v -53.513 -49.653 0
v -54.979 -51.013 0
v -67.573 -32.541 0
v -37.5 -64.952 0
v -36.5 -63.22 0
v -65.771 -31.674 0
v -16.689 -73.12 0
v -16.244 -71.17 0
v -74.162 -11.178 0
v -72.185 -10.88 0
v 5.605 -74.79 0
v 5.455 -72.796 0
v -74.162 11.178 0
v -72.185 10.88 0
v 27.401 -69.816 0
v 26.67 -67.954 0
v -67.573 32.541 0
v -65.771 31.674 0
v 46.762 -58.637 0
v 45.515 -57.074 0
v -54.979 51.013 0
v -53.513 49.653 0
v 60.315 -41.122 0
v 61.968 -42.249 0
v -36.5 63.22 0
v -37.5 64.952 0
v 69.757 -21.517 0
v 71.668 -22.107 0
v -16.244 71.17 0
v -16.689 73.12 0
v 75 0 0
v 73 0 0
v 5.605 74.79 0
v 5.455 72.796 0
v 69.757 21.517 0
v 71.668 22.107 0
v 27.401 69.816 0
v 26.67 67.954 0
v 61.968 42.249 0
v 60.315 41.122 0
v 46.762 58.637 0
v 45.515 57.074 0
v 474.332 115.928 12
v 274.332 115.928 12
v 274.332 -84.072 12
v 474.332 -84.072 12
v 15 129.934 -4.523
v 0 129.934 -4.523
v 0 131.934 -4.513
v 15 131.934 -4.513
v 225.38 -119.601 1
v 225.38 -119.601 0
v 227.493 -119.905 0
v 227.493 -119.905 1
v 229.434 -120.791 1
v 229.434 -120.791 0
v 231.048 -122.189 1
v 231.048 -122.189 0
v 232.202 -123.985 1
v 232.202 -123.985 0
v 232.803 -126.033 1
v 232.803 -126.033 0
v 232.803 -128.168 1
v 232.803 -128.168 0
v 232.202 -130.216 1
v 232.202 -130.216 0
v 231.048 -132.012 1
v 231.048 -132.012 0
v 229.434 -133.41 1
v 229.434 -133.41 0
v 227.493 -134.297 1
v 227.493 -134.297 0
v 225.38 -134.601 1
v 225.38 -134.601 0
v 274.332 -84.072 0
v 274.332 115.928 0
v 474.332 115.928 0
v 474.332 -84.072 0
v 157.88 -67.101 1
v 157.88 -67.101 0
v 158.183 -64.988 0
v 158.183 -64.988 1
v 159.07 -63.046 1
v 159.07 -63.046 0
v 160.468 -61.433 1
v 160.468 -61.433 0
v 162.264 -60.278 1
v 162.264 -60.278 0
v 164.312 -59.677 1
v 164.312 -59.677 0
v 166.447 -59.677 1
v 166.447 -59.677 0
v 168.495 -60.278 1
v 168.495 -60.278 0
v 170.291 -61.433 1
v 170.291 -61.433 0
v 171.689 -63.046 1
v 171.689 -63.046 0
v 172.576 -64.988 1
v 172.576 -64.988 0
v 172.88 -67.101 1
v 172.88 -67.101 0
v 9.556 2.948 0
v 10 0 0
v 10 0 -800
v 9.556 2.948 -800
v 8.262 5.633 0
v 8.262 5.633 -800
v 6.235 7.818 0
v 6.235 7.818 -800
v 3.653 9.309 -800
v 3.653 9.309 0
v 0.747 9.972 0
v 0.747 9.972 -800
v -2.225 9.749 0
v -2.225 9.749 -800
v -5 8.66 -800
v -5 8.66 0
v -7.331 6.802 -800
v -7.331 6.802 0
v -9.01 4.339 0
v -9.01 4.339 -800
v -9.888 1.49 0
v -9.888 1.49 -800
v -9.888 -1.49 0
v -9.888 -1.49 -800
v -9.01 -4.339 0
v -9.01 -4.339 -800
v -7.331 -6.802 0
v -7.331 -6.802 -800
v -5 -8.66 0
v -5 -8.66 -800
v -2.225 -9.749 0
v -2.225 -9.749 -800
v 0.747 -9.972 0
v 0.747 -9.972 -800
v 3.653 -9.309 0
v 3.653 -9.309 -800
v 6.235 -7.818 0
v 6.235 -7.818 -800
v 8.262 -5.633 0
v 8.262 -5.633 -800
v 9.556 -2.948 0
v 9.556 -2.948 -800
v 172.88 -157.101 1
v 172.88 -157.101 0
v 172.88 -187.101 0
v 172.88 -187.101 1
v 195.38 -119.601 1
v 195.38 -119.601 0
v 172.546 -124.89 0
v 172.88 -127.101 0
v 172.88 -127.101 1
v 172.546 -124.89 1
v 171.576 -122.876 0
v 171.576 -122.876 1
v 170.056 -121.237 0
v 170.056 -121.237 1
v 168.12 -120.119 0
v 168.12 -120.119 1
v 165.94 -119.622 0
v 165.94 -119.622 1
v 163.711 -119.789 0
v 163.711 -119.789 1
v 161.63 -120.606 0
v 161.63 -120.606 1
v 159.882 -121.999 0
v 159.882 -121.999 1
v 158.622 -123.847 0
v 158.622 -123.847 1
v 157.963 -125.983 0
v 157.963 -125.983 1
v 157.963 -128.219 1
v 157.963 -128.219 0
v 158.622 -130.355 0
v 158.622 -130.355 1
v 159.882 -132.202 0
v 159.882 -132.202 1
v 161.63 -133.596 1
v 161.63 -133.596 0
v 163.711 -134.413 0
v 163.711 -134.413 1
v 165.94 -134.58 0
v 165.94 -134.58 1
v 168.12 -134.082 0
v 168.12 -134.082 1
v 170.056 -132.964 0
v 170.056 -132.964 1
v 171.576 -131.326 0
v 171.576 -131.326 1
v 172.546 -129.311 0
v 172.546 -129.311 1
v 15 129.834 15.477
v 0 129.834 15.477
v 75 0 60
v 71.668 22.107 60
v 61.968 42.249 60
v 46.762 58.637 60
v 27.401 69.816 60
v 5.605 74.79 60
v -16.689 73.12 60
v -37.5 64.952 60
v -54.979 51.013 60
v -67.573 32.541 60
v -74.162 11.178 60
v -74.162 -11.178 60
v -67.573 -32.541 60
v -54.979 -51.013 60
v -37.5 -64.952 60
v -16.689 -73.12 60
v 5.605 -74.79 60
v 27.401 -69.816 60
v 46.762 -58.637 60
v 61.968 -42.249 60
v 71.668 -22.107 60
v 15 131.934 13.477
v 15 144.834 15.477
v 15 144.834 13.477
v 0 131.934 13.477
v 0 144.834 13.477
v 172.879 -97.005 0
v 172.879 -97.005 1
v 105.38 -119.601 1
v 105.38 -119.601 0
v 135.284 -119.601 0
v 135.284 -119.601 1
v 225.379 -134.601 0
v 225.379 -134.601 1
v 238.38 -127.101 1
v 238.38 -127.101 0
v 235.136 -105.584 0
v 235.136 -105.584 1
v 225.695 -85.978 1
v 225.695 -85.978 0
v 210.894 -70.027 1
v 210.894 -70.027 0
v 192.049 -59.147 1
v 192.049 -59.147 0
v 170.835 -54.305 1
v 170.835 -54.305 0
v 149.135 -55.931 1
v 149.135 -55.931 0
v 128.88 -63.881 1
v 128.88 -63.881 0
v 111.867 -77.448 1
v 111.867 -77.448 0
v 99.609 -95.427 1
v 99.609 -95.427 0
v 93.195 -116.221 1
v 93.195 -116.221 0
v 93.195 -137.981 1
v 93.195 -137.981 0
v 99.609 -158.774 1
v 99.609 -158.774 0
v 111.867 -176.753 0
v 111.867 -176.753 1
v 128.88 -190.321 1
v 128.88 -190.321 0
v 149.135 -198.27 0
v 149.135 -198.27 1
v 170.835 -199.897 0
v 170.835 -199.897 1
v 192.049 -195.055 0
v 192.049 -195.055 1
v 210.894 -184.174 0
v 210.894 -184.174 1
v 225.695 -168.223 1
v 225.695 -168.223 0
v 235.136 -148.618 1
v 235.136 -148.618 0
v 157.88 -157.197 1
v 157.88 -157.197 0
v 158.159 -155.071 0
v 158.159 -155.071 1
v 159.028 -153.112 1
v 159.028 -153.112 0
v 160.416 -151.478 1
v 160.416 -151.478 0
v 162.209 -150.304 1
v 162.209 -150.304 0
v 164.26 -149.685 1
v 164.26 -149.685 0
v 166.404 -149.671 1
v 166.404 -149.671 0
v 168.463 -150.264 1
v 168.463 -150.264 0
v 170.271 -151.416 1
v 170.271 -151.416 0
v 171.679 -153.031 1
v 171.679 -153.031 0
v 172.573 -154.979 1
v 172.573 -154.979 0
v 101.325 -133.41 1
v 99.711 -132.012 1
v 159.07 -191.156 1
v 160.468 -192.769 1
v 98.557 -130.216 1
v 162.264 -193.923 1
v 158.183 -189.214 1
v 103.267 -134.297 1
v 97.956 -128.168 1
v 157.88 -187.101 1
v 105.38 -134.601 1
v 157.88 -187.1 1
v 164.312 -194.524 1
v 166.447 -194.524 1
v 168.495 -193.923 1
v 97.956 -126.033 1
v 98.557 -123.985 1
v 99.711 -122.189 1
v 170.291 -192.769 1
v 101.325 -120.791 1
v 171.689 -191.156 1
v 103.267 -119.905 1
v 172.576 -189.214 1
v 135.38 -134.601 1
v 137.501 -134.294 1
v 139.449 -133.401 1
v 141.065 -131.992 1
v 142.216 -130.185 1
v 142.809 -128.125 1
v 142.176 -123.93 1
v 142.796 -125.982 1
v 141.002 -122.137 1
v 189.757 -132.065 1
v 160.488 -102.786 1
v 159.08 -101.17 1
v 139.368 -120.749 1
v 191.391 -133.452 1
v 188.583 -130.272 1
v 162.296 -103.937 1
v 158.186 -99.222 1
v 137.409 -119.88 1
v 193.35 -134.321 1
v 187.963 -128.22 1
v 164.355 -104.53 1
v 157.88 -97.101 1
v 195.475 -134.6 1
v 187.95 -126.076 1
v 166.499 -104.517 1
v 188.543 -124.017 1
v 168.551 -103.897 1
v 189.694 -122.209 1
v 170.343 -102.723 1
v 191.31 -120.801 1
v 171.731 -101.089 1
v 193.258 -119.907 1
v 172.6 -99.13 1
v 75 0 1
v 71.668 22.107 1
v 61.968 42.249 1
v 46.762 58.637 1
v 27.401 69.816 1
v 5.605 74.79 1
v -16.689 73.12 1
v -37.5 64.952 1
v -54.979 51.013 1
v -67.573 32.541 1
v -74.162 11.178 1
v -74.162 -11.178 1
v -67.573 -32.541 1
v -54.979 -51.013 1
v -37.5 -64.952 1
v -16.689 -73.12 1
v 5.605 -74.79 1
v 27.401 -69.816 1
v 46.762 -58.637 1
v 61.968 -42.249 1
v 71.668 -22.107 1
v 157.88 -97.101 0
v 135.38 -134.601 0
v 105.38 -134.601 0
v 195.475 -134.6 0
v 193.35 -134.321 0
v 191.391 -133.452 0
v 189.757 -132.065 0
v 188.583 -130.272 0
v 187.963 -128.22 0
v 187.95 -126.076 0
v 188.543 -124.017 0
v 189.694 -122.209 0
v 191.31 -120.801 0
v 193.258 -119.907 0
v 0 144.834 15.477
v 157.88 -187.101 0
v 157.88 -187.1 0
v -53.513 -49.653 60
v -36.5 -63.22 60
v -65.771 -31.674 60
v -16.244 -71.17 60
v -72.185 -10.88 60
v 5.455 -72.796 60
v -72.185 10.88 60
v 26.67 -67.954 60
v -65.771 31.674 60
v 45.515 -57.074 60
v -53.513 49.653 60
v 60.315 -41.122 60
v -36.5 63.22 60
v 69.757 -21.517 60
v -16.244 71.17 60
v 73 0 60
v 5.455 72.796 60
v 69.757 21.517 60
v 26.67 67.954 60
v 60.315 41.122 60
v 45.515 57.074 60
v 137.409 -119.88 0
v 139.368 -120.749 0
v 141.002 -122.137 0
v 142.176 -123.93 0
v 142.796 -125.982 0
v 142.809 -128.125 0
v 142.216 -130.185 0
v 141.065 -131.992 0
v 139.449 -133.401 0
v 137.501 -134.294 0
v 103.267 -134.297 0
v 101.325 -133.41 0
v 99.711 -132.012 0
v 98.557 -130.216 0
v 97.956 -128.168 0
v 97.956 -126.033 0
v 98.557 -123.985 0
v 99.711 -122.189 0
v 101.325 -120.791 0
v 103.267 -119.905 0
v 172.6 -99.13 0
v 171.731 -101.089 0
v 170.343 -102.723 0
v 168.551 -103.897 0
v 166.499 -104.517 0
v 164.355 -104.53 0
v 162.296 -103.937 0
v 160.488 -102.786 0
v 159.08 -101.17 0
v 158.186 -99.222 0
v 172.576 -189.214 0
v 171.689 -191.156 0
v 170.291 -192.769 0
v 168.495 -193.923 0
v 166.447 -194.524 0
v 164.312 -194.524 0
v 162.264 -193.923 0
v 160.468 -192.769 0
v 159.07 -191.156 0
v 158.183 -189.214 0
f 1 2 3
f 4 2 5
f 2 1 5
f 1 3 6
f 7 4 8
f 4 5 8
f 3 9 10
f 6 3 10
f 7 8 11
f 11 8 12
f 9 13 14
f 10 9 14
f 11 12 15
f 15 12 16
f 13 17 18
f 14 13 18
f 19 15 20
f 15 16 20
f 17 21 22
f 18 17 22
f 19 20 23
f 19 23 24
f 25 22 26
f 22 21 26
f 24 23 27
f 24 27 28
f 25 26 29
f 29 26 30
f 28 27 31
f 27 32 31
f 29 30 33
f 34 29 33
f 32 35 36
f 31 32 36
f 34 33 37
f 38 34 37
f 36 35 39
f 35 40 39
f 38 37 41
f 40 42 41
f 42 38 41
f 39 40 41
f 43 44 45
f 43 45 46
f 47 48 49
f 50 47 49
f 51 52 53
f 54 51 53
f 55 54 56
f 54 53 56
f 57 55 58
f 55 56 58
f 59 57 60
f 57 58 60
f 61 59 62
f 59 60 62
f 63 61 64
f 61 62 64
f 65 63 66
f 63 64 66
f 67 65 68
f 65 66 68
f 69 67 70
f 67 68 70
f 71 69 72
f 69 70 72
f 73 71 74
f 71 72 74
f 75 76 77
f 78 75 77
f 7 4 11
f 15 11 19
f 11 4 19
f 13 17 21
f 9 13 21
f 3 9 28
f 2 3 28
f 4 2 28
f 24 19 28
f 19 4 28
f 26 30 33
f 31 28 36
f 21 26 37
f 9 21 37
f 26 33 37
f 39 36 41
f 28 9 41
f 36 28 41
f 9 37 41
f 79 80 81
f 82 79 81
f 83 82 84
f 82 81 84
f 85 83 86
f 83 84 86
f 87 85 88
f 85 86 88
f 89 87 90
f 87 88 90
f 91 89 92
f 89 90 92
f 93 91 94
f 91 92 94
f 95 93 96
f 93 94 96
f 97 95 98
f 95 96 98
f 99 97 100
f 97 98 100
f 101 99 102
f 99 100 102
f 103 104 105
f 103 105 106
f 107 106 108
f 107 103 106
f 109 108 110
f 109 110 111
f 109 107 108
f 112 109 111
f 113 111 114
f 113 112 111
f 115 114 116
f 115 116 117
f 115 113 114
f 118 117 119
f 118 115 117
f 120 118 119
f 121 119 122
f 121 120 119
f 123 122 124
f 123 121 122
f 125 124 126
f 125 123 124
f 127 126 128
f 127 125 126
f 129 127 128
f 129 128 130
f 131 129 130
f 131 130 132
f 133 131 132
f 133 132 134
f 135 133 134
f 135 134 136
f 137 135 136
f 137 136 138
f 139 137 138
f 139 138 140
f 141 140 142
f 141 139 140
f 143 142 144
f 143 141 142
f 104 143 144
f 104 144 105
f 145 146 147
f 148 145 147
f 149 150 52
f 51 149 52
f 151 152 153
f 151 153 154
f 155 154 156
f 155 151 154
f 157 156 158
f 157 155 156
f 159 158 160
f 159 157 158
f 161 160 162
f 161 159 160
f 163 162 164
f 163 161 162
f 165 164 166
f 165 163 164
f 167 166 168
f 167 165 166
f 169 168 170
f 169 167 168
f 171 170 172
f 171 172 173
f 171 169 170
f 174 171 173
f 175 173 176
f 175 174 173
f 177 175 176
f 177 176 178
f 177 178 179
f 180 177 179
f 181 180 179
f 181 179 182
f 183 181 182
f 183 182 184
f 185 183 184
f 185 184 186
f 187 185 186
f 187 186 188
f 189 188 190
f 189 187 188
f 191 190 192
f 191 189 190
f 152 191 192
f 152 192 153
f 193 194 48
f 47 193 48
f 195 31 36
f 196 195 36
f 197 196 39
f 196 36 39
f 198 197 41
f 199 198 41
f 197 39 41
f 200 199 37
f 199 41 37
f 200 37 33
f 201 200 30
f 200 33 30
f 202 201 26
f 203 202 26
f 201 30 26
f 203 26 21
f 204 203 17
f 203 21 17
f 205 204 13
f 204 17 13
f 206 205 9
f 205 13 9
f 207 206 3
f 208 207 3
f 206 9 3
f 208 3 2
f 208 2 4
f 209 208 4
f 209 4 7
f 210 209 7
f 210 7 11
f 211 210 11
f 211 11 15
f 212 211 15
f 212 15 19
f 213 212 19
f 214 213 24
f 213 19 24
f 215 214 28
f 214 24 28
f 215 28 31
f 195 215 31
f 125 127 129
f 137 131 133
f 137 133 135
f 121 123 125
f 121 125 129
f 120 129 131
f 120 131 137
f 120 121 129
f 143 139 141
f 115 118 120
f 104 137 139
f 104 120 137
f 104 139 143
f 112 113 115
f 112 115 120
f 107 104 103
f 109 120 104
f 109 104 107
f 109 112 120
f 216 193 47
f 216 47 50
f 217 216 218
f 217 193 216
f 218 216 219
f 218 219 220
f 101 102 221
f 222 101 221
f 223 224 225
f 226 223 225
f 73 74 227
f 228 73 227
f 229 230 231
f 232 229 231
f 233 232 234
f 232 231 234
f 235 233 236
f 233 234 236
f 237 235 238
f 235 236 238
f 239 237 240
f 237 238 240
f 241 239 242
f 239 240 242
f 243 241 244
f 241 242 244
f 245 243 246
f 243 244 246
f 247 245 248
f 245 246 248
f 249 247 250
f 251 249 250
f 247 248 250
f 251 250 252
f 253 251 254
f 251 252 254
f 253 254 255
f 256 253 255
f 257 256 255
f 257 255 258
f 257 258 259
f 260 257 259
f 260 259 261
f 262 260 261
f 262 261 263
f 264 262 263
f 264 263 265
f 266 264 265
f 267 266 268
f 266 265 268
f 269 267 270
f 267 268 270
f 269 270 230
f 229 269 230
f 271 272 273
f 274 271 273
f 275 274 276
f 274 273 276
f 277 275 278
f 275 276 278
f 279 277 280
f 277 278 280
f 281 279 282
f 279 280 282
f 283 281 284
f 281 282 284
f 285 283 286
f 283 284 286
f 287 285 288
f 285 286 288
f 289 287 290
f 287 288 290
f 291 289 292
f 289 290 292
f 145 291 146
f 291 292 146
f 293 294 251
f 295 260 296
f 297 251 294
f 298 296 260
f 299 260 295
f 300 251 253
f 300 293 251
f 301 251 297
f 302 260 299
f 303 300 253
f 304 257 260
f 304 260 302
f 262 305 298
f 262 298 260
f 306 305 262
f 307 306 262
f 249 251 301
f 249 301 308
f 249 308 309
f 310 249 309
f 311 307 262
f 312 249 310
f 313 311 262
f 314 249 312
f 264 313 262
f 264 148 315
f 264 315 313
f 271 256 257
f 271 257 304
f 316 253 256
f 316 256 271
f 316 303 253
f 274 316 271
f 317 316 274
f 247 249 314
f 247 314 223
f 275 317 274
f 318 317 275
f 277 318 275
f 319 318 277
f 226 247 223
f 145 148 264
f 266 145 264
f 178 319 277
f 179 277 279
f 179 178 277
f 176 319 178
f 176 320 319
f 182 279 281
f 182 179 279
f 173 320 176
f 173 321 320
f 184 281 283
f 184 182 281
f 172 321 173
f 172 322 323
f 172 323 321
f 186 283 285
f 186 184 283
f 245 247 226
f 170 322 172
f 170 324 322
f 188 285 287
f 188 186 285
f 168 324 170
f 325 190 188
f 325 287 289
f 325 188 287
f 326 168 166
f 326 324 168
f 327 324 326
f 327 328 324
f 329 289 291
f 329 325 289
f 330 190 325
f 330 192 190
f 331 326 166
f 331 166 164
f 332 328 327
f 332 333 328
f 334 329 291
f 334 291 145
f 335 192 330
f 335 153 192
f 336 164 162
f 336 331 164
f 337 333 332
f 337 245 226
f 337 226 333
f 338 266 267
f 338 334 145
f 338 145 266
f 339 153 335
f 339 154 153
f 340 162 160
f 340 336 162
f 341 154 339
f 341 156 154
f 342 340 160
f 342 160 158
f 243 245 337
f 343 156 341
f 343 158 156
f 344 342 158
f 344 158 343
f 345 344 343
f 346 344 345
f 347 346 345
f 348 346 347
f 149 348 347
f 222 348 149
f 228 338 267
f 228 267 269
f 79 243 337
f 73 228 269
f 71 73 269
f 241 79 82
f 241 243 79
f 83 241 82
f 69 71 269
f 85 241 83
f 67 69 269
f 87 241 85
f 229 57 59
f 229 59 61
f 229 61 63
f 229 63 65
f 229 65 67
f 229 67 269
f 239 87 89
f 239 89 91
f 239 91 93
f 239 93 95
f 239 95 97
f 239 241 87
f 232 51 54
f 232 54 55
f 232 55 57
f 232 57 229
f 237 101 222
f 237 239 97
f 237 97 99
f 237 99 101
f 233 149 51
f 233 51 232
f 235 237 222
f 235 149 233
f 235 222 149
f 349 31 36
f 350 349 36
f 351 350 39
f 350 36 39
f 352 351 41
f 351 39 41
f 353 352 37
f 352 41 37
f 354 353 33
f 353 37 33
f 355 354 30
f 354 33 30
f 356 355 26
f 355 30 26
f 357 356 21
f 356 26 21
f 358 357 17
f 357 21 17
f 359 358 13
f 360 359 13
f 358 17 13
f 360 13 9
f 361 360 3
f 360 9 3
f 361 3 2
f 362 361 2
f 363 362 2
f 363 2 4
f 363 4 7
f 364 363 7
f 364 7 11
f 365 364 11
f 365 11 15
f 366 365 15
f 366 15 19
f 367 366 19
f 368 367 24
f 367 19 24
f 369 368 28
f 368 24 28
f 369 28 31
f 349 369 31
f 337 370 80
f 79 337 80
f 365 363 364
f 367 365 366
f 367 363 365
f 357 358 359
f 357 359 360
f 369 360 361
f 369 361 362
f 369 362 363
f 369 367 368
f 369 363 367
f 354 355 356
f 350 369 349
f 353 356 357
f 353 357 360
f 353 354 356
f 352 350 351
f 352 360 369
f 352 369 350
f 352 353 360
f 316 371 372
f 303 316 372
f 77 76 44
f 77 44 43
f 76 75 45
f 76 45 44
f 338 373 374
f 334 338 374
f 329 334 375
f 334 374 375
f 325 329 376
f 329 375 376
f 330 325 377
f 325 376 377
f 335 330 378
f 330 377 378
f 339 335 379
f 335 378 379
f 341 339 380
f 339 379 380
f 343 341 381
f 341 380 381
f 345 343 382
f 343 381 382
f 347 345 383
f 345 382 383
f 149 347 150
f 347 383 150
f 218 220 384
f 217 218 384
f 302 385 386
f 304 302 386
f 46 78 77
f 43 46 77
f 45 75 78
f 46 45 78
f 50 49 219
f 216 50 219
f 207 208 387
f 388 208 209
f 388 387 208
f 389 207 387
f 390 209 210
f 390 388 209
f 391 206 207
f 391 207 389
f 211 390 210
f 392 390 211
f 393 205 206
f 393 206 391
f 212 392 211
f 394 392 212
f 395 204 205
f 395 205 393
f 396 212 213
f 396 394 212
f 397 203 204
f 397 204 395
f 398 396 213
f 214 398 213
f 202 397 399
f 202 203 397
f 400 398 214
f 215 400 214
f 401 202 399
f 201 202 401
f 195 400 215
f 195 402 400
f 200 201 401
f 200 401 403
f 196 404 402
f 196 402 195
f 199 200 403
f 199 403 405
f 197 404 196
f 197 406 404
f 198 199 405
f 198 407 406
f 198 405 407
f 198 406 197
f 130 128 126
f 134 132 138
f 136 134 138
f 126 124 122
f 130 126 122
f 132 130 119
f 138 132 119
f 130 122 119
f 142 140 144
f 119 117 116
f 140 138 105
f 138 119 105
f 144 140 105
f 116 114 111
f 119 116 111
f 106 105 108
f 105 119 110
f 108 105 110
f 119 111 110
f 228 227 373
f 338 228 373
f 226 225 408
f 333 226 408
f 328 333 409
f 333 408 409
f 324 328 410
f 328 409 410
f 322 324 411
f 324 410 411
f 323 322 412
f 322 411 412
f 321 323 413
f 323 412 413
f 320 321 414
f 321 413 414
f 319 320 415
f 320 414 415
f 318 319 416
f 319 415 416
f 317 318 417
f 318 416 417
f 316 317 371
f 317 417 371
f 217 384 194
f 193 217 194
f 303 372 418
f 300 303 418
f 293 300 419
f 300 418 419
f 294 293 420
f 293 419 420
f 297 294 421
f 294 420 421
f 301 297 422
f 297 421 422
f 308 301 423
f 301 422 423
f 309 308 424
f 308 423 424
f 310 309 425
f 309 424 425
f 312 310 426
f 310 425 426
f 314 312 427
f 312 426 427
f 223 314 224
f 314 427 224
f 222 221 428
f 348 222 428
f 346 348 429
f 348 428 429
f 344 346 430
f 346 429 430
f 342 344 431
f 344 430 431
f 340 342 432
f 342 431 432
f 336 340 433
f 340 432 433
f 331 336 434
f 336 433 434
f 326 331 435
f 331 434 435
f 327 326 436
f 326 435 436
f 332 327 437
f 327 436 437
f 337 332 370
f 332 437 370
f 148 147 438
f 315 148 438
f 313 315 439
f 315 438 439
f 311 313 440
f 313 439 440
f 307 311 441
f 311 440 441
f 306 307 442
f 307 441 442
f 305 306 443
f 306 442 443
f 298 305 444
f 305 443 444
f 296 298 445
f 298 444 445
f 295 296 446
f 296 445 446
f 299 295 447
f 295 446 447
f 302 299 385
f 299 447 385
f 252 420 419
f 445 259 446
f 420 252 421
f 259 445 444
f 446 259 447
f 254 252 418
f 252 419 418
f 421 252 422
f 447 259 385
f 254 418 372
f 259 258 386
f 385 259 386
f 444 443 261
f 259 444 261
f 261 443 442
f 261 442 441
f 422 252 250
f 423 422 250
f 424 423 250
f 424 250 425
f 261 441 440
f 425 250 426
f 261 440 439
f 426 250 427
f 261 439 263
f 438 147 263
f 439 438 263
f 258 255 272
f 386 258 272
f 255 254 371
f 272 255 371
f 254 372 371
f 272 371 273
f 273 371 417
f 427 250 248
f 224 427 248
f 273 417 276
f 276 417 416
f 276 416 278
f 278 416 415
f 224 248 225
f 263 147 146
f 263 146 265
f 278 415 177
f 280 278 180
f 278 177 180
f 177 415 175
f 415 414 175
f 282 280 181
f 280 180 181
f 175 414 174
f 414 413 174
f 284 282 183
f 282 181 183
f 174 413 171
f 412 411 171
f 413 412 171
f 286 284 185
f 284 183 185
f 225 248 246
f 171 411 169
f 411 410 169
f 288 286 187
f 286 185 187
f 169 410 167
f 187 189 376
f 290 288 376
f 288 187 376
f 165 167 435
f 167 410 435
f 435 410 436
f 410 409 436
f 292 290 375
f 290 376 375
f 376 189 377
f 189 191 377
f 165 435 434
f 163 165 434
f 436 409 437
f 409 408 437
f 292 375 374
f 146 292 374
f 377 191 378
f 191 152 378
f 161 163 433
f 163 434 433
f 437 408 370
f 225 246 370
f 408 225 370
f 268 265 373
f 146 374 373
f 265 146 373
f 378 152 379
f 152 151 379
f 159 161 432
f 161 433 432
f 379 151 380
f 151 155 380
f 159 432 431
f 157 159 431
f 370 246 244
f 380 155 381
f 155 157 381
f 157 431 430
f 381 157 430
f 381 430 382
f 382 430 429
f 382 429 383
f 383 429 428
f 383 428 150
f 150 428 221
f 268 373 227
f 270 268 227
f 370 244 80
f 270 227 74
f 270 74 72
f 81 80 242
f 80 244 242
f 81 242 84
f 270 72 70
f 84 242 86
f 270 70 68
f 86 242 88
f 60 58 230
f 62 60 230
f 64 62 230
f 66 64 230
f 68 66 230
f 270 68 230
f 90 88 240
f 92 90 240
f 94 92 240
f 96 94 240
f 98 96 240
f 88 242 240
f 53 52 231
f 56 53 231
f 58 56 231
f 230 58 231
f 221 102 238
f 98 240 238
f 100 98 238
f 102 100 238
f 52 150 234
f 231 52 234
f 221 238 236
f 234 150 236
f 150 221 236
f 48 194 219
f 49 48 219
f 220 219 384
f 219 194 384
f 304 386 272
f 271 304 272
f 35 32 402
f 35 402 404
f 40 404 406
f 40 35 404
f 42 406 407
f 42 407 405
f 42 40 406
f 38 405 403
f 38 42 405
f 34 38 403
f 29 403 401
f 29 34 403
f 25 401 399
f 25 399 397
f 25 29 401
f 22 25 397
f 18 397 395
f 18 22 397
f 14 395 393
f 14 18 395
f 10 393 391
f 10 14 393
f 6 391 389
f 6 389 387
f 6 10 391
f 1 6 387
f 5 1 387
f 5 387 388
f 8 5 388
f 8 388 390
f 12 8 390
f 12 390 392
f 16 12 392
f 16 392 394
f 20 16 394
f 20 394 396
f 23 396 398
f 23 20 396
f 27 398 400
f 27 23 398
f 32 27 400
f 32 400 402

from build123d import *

# Parameters (mm, degrees)
F0_R     = 75
F0_R_2   = 73
F1_DEPTH = 60
F0_R_3   = 10
F2_DEPTH = 800
F3_DEPTH = 1
F4_DEPTH = 12
F0_W     = 200
F0_H     = 200
F0_R_4   = 7.5
F7_DEPTH = 1
F9_DEPTH = 15


with BuildPart() as f1:
    # F0 (on Top) → F1 (new body)
    with BuildSketch(Plane.XY):
        Circle(F0_R)
        Circle(F0_R_2, mode=Mode.SUBTRACT)
    extrude(amount=F1_DEPTH)


with BuildPart() as f2:
    # F0 (on Top) → F2 (new body)
    with BuildSketch(Plane.XY):
        Circle(F0_R_3)
    extrude(amount=-F2_DEPTH)


with BuildPart() as f3:
    # F0 (on Top) → F3 (new body)
    with BuildSketch(Plane.XY):
        Circle(F0_R)
        Circle(F0_R_2, mode=Mode.SUBTRACT)
        Circle(F0_R_2)
        Circle(F0_R_3, mode=Mode.SUBTRACT)
        Circle(F0_R_3)
    extrude(amount=F3_DEPTH)


with BuildPart() as f4:
    # F0 (on Top) → F4 (new body)
    with BuildSketch(Plane.XY):
        Circle(F0_R)
        Circle(F0_R_2, mode=Mode.SUBTRACT)
    extrude(amount=F4_DEPTH)


with BuildPart() as f4b:
    # F0 (on Top) → F4, piece 2 (new body)
    with BuildSketch(Plane.XY):
        with Locations((374.331599474, 15.927529335)):
            Rectangle(F0_W, F0_H)
    extrude(amount=F4_DEPTH)


with BuildPart() as f4c:
    # F0 (on Top) → F4, piece 3 (new body)
    with BuildSketch(Plane.XY):
        with Locations((165.379524231, -127.1007210016)):
            Circle(F0_R_2)
        with BuildLine():
            ThreePointArc((157.8801363911, -157.1965438945), (165.3316118069, -149.6008740432), (172.879524231, -157.1007210016))
            Line((172.879524231, -157.1007210016), (172.879524231, -187.1007210016))
            ThreePointArc((172.879524231, -187.1007210016), (165.379524231, -194.6007210016), (157.879524231, -187.1007210016))
            Line((157.879524231, -187.1007210016), (157.8795242372, -187.1004139411))
            Line((157.8795242372, -187.1004139411), (157.8801363911, -157.1965438945))
        make_face(mode=Mode.SUBTRACT)
        with BuildLine():
            ThreePointArc((135.2837013381, -119.6013331617), (142.8793711894, -127.0528085775), (135.379524231, -134.6007210016))
            Line((135.379524231, -134.6007210016), (105.379524231, -134.6007210016))
            ThreePointArc((105.379524231, -134.6007210016), (97.879524231, -127.1007210016), (105.379524231, -119.6007210016))
            Line((105.379524231, -119.6007210016), (105.3798312914, -119.6007210079))
            Line((105.3798312914, -119.6007210079), (135.2837013381, -119.6013331617))
        make_face(mode=Mode.SUBTRACT)
        with Locations((165.379524231, -127.1007210016)):
            Circle(F0_R_4, mode=Mode.SUBTRACT)
        with BuildLine():
            ThreePointArc((172.8789120709, -97.0048981088), (165.4274366551, -104.60056796), (157.879524231, -97.1007210016))
            Line((157.879524231, -97.1007210016), (157.879524231, -67.1007210016))
            ThreePointArc((157.879524231, -67.1007210016), (165.379524231, -59.6007210016), (172.879524231, -67.1007210016))
            ThreePointArc((172.879524231, -67.1007210016), (172.8795242294, -67.1008745319), (172.8795242247, -67.1010280621))
            Line((172.8795242247, -67.1010280621), (172.8789120709, -97.0048981088))
        make_face(mode=Mode.SUBTRACT)
        with BuildLine():
            ThreePointArc((195.4753471238, -134.6001088415), (187.8796772725, -127.1486334257), (195.379524231, -119.6007210016))
            Line((195.379524231, -119.6007210016), (225.379524231, -119.6007210016))
            ThreePointArc((225.379524231, -119.6007210016), (232.879524231, -127.1007210016), (225.379524231, -134.6007210016))
            Line((225.379524231, -134.6007210016), (225.3792171705, -134.6007209953))
            Line((225.3792171705, -134.6007209953), (195.4753471238, -134.6001088415))
        make_face(mode=Mode.SUBTRACT)
    extrude(amount=F4_DEPTH)


with BuildPart() as f7:
    # F0 (on Top) → F7 (new body)
    with BuildSketch(Plane.XY):
        with Locations((165.379524231, -127.1007210016)):
            Circle(F0_R_2)
        with BuildLine():
            ThreePointArc((157.8801363911, -157.1965438945), (165.3316118069, -149.6008740432), (172.879524231, -157.1007210016))
            Line((172.879524231, -157.1007210016), (172.879524231, -187.1007210016))
            ThreePointArc((172.879524231, -187.1007210016), (165.379524231, -194.6007210016), (157.879524231, -187.1007210016))
            Line((157.879524231, -187.1007210016), (157.8795242372, -187.1004139411))
            Line((157.8795242372, -187.1004139411), (157.8801363911, -157.1965438945))
        make_face(mode=Mode.SUBTRACT)
        with BuildLine():
            ThreePointArc((135.2837013381, -119.6013331617), (142.8793711894, -127.0528085775), (135.379524231, -134.6007210016))
            Line((135.379524231, -134.6007210016), (105.379524231, -134.6007210016))
            ThreePointArc((105.379524231, -134.6007210016), (97.879524231, -127.1007210016), (105.379524231, -119.6007210016))
            Line((105.379524231, -119.6007210016), (105.3798312914, -119.6007210079))
            Line((105.3798312914, -119.6007210079), (135.2837013381, -119.6013331617))
        make_face(mode=Mode.SUBTRACT)
        with Locations((165.379524231, -127.1007210016)):
            Circle(F0_R_4, mode=Mode.SUBTRACT)
        with BuildLine():
            ThreePointArc((172.8789120709, -97.0048981088), (165.4274366551, -104.60056796), (157.879524231, -97.1007210016))
            Line((157.879524231, -97.1007210016), (157.879524231, -67.1007210016))
            ThreePointArc((157.879524231, -67.1007210016), (165.379524231, -59.6007210016), (172.879524231, -67.1007210016))
            ThreePointArc((172.879524231, -67.1007210016), (172.8795242294, -67.1008745319), (172.8795242247, -67.1010280621))
            Line((172.8795242247, -67.1010280621), (172.8789120709, -97.0048981088))
        make_face(mode=Mode.SUBTRACT)
        with BuildLine():
            ThreePointArc((195.4753471238, -134.6001088415), (187.8796772725, -127.1486334257), (195.379524231, -119.6007210016))
            Line((195.379524231, -119.6007210016), (225.379524231, -119.6007210016))
            ThreePointArc((225.379524231, -119.6007210016), (232.879524231, -127.1007210016), (225.379524231, -134.6007210016))
            Line((225.379524231, -134.6007210016), (225.3792171705, -134.6007209953))
            Line((225.3792171705, -134.6007209953), (195.4753471238, -134.6001088415))
        make_face(mode=Mode.SUBTRACT)
    extrude(amount=F7_DEPTH)


with BuildPart() as f9:
    # F8 (on Right) → F9 (new body)
    with BuildSketch(Plane.YZ):
        Polygon((144.8343504965, 13.4767872929), (144.8343504965, 15.4767872929), (129.8343504965, 15.4767872929), (129.933606843, -4.5232127071), (131.9335822139, -4.5132871947), (131.9335822139, 13.4767872929), align=None)
    extrude(amount=F9_DEPTH)


solid = Compound([f1.part, f2.part, f3.part, f4b.part, f7.part, f9.part])
